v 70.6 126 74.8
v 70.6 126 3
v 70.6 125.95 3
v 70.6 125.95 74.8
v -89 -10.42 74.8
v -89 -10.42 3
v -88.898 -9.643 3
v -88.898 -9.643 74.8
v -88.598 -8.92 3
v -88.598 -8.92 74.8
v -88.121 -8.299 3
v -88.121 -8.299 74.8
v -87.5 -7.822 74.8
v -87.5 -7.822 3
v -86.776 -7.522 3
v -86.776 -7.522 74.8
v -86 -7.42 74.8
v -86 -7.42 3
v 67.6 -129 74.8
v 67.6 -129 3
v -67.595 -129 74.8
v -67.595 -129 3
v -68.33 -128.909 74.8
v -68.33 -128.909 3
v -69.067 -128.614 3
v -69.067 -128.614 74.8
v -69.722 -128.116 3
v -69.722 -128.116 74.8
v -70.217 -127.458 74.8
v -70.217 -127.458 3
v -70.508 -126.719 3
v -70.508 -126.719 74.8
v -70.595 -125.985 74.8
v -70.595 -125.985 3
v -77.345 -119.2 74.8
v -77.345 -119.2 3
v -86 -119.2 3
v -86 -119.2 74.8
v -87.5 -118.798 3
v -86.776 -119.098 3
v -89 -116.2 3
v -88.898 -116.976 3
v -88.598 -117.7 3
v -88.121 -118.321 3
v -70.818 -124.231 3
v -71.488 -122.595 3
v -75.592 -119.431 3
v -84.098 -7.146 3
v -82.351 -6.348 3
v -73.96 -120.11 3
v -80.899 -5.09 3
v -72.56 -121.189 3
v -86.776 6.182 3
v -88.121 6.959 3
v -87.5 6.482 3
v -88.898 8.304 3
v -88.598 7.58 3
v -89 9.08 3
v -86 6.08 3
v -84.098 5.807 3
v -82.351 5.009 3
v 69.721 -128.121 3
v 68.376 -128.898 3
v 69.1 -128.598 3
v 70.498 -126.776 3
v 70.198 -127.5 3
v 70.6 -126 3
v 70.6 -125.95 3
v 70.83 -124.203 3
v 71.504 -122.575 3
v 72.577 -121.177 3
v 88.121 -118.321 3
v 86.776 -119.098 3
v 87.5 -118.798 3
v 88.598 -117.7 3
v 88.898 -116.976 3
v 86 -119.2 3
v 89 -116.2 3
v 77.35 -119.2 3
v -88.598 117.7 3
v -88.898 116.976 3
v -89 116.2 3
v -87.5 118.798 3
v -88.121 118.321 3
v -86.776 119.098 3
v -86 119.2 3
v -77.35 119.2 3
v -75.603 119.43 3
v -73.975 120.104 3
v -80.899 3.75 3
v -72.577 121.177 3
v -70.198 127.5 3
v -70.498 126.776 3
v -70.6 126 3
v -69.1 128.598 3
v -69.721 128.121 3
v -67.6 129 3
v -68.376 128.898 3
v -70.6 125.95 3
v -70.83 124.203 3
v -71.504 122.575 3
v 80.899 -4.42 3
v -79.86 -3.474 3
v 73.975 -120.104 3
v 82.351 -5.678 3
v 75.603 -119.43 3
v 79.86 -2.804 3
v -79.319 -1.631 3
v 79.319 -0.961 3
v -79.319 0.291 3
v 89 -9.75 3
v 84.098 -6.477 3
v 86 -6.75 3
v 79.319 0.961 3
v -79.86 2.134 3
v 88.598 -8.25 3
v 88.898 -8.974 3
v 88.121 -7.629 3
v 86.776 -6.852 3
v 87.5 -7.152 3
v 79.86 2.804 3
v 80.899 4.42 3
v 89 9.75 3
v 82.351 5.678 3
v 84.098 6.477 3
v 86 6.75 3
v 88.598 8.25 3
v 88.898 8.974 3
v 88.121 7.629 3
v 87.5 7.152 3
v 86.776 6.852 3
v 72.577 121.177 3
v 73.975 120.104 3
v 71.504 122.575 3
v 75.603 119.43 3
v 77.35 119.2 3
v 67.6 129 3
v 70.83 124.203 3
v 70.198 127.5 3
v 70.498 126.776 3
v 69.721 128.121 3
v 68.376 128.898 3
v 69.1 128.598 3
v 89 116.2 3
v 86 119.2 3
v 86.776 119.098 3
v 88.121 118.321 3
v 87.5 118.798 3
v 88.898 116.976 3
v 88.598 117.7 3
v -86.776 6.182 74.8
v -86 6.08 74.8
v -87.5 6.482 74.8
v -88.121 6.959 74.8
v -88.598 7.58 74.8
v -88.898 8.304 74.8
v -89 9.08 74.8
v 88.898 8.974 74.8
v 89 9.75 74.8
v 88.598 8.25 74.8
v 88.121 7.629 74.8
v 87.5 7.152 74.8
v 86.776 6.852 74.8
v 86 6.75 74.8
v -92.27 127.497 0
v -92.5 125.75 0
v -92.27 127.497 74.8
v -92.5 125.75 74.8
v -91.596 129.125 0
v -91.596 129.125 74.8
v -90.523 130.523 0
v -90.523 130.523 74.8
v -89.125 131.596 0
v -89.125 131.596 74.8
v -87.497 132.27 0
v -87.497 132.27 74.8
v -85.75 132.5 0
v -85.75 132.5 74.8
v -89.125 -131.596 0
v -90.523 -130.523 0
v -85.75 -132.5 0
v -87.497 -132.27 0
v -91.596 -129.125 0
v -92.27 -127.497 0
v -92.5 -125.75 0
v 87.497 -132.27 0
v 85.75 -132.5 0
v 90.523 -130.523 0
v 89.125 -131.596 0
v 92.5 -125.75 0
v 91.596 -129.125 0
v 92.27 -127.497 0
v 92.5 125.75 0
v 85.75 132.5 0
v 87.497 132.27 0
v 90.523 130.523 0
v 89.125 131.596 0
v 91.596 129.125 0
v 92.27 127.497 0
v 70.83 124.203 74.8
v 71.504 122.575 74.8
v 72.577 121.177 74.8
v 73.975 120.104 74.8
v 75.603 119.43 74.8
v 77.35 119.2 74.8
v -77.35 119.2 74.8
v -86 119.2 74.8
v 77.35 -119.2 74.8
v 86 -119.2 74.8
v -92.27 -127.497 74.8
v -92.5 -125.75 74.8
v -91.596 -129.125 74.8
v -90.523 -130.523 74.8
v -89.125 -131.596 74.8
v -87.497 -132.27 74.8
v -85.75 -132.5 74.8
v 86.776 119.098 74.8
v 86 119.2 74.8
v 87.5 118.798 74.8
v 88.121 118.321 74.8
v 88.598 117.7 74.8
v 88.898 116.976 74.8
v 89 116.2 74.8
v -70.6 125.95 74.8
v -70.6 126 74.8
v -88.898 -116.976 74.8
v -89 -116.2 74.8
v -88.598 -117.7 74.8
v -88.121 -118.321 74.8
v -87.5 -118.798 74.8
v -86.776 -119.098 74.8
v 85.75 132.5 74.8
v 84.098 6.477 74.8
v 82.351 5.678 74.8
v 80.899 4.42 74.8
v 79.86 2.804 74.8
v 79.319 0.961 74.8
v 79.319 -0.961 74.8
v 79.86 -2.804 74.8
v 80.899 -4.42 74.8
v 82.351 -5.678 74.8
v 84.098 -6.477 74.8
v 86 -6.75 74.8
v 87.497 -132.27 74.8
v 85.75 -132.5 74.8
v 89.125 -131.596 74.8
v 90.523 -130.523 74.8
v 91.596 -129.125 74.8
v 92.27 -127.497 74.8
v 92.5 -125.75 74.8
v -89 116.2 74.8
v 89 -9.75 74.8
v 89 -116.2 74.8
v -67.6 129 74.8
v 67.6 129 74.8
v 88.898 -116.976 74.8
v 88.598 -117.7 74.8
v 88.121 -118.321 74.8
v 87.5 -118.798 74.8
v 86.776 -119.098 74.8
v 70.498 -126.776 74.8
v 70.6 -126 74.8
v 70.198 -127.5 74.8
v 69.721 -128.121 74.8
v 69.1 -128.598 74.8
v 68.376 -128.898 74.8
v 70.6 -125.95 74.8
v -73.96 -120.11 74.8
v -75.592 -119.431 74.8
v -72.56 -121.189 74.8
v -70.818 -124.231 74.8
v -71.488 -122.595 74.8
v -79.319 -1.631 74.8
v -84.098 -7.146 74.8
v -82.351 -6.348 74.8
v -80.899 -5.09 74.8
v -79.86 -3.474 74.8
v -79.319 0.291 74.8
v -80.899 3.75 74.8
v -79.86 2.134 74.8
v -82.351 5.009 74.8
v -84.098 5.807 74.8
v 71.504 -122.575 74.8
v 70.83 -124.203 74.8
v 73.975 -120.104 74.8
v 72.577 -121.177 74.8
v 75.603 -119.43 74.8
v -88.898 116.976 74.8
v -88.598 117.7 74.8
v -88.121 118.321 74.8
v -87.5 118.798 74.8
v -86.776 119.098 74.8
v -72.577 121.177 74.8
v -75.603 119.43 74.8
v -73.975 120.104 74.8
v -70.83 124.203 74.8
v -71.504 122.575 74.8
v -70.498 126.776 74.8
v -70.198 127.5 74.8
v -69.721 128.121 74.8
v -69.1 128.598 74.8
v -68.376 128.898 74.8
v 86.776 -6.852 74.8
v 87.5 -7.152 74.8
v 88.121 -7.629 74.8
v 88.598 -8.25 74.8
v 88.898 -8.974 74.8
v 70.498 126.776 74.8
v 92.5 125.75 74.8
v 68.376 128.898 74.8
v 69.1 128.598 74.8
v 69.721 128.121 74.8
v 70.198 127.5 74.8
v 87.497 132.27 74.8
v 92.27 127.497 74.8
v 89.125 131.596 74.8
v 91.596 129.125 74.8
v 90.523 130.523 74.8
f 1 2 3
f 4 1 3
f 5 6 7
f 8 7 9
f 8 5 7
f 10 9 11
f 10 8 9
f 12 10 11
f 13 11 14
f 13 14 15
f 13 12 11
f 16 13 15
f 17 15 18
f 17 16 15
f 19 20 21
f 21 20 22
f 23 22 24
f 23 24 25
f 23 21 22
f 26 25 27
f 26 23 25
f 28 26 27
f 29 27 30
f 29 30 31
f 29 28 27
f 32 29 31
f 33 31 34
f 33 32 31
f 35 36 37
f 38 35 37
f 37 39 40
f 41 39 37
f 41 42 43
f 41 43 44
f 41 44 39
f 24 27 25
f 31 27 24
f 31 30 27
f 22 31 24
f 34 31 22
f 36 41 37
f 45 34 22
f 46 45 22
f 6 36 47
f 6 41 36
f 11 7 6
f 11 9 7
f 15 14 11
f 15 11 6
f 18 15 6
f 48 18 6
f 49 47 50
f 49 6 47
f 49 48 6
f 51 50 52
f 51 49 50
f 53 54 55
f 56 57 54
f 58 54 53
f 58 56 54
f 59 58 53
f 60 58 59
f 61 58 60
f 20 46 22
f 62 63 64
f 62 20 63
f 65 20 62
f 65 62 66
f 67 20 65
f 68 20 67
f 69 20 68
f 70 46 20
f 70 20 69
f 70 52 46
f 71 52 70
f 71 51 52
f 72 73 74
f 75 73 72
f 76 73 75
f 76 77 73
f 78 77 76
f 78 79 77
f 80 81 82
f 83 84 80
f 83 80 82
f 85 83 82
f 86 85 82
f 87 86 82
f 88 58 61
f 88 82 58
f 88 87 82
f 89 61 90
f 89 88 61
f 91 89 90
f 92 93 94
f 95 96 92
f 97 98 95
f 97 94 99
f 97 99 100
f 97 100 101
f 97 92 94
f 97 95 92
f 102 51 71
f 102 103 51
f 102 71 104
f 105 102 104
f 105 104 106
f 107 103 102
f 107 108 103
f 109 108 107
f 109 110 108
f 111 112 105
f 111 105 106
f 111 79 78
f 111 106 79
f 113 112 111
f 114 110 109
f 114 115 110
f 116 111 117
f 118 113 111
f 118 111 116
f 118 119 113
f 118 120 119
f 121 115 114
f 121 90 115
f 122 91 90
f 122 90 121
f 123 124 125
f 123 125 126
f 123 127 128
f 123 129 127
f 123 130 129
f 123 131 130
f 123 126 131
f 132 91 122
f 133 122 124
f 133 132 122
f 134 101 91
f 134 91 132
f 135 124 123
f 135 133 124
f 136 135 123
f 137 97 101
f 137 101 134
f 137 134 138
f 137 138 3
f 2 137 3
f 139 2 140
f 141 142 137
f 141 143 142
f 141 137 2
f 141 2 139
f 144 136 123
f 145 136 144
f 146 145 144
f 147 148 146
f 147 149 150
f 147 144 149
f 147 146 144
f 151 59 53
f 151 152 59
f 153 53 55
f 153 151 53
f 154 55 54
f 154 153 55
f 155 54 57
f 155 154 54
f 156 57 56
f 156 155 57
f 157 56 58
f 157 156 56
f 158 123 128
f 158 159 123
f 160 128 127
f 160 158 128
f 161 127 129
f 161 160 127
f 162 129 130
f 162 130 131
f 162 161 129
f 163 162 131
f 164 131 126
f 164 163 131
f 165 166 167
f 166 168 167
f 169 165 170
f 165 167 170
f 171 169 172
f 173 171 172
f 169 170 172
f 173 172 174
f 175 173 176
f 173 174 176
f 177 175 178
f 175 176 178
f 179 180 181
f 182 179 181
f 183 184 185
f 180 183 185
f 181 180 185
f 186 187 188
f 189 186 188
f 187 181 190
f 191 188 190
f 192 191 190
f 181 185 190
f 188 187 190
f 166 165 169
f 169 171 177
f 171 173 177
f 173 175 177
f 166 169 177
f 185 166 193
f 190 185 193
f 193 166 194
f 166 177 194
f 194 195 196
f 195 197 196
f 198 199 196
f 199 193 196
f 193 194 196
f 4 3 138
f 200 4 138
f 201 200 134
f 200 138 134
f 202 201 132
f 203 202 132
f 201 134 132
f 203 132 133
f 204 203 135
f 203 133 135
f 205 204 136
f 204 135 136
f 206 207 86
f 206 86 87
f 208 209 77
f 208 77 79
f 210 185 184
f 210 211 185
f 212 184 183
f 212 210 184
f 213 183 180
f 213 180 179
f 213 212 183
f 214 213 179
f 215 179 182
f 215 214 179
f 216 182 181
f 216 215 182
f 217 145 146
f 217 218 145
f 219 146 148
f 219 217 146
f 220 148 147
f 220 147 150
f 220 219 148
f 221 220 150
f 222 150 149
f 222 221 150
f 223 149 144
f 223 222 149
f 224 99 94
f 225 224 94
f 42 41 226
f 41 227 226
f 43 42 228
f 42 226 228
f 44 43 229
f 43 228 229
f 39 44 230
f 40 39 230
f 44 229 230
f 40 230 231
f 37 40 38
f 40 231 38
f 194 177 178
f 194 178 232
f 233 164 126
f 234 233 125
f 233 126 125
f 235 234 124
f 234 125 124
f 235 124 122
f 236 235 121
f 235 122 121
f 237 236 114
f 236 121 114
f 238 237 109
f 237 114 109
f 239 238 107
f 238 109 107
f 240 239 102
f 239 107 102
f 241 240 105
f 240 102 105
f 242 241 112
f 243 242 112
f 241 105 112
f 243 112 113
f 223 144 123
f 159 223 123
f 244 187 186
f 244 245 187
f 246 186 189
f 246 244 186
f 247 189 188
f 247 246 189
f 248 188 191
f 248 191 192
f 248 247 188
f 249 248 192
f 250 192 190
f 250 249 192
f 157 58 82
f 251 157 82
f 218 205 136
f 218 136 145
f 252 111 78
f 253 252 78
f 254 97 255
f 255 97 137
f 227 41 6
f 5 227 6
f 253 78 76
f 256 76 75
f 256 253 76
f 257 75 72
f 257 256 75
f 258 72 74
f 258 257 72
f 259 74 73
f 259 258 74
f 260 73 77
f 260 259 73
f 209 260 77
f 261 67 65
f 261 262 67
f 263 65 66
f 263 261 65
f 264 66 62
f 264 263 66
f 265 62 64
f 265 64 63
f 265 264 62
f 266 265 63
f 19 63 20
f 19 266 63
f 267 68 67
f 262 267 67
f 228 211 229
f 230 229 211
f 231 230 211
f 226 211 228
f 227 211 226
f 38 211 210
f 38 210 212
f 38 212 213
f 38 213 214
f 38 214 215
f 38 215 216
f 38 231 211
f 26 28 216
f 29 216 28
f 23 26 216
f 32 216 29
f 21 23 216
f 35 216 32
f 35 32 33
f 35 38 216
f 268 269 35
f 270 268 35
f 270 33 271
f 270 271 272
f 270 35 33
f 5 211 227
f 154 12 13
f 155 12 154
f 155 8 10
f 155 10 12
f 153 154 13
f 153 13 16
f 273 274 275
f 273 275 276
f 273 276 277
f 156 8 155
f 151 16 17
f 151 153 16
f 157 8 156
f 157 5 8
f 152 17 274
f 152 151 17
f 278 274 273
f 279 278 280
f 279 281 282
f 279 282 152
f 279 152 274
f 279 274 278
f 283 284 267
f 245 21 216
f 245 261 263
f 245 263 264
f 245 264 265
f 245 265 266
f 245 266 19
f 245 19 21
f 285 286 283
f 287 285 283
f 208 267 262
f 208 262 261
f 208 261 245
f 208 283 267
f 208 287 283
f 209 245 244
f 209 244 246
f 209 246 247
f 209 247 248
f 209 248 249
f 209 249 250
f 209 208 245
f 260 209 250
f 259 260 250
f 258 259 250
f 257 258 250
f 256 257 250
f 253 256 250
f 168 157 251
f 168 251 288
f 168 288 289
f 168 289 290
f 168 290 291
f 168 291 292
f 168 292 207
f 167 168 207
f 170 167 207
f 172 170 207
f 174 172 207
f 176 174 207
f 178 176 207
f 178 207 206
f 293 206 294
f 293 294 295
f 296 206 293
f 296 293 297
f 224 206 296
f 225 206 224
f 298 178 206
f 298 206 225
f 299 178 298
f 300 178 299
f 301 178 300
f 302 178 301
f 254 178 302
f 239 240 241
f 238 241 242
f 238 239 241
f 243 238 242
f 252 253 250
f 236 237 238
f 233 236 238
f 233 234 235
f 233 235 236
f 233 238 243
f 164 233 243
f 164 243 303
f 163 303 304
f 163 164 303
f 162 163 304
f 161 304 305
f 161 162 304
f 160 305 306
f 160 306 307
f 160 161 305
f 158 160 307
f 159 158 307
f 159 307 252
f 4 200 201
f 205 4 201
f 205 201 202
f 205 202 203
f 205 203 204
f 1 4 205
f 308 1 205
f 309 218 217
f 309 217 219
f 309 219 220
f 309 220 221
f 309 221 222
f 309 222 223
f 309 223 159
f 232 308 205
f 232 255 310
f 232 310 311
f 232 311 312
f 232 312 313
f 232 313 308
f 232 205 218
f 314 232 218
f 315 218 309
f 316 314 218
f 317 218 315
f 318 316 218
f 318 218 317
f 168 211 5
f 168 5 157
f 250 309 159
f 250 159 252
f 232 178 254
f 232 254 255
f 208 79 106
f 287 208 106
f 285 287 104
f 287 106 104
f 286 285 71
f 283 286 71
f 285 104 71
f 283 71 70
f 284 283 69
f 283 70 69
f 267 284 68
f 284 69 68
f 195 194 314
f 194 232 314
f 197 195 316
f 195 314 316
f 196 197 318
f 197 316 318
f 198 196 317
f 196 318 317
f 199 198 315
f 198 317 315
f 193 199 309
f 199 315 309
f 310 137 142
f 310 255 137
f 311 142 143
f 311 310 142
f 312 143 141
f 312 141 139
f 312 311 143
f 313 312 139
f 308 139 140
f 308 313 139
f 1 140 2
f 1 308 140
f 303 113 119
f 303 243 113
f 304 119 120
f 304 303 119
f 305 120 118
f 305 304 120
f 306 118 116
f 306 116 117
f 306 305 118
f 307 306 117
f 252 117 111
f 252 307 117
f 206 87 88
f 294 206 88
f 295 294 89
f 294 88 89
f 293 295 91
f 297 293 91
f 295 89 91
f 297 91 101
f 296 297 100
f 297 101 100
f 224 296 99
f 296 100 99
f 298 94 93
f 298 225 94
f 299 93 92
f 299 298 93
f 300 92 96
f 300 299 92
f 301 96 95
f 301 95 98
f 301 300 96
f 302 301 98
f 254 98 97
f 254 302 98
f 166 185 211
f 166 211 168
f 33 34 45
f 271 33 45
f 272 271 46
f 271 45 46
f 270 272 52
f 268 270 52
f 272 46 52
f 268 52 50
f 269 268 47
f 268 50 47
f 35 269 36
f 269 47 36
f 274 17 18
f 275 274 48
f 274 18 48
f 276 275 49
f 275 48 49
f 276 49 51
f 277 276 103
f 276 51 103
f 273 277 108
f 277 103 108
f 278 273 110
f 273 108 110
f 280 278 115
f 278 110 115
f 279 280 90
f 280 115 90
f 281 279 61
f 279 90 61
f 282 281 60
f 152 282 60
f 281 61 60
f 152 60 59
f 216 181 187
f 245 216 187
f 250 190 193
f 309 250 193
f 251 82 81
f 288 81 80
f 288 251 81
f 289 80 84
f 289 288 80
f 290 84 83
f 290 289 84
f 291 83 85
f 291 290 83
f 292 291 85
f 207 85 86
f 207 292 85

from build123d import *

# Parameters (mm, degrees)
F1_DEPTH = 3
F0_W     = 185
F0_H     = 265
F2_DEPTH = 74.8
F3_R     = 6.75
F4_R     = 2.99999


# Not quite as in the source:
# - a fillet or chamfer is up to 0.001 mm smaller than in the source, because OpenCascade refuses the exact size
# - ends of sketch curves that miss each other by under 0.0002 mm in the source are joined


with BuildPart() as f1:
    # F0 (on Top) → F1 (new body)
    with BuildSketch(Plane.XY):
        with BuildLine():
            Line((70.6, 125.95), (70.6, 129))
            Line((70.6, 129), (-70.6, 129))
            Line((-70.6, 129), (-70.6, 125.95))
            ThreePointArc((-70.6, 125.95), (-72.577029227, 121.177029227), (-77.35, 119.2))
            Line((-77.35, 119.2), (-89, 119.2))
            Line((-89, 119.2), (-89, 6.080118008))
            Line((-89, 6.080118008), (-86, 6.080118008))
            ThreePointArc((-86, 6.080118008), (-79.25, -0.669881992), (-86, -7.419881992))
            Line((-86, -7.419881992), (-89, -7.419881992))
            Line((-89, -7.419881992), (-89, -119.2))
            Line((-89, -119.2), (-77.3450501441, -119.2))
            ThreePointArc((-77.3450501441, -119.2), (-72.4815603684, -121.2692984284), (-70.6, -126.2084541623))
            Line((-70.6, -126.2084541623), (-70.6, -129))
            Line((-70.6, -129), (70.6, -129))
            Line((70.6, -129), (70.6, -125.95))
            ThreePointArc((70.6, -125.95), (72.577029227, -121.177029227), (77.35, -119.2))
            Line((77.35, -119.2), (89, -119.2))
            Line((89, -119.2), (89, -6.75))
            Line((89, -6.75), (86, -6.75))
            ThreePointArc((86, -6.75), (79.25, 0), (86, 6.75))
            Line((86, 6.75), (89, 6.75))
            Line((89, 6.75), (89, 119.2))
            Line((89, 119.2), (77.35, 119.2))
            ThreePointArc((77.35, 119.2), (72.577029227, 121.177029227), (70.6, 125.95))
        make_face()
    extrude(amount=F1_DEPTH)

    # F0 (on Top) → F2 (join)
    with BuildSketch(Plane.XY):
        Rectangle(F0_W, F0_H)
        Polygon((70.6, 129), (89, 129), (89, 119.2), (89, 6.75), (89, -6.75), (89, -119.2), (89, -129), (70.6, -129), (-70.6, -129), (-89, -129), (-89, -119.2), (-89, -7.419881992), (-89, 6.080118008), (-89, 119.2), (-89, 129), (-70.6, 129), align=None, mode=Mode.SUBTRACT)
        with BuildLine():
            Line((-77.3450501441, -119.2), (-89, -119.2))
            Line((-89, -119.2), (-89, -129))
            Line((-89, -129), (-70.6, -129))
            Line((-70.6, -129), (-70.6, -126.2084541623))
            ThreePointArc((-70.6, -126.2084541623), (-72.4815603684, -121.2692984284), (-77.3450501441, -119.2))
        make_face()
        with BuildLine():
            Line((89, -129), (89, -119.2))
            Line((89, -119.2), (77.35, -119.2))
            ThreePointArc((77.35, -119.2), (72.577029227, -121.177029227), (70.6, -125.95))
            Line((70.6, -125.95), (70.6, -129.000006485))
            Line((70.6, -129.000006485), (89, -129))
        make_face()
        with BuildLine():
            Line((-70.6, 125.95), (-70.6, 129))
            Line((-70.6, 129), (-89, 129))
            Line((-89, 129), (-89, 119.2))
            Line((-89, 119.2), (-77.35, 119.2))
            ThreePointArc((-77.35, 119.2), (-72.577029227, 121.177029227), (-70.6, 125.95))
        make_face()
        with BuildLine():
            Line((89, 119.2), (89, 129))
            Line((89, 129), (70.6, 129))
            Line((70.6, 129), (70.6, 125.95))
            ThreePointArc((70.6, 125.95), (72.577029227, 121.177029227), (77.35, 119.2))
            Line((77.35, 119.2), (89, 119.2))
        make_face()
        with BuildLine():
            Line((-86, 6.080118008), (-89, 6.080118008))
            Line((-89, 6.080118008), (-89, -7.419881992))
            Line((-89, -7.419881992), (-86, -7.419881992))
            ThreePointArc((-86, -7.419881992), (-79.25, -0.669881992), (-86, 6.080118008))
        make_face()
        with BuildLine():
            Line((89, -6.75), (89, 6.75))
            Line((89, 6.75), (86, 6.75))
            ThreePointArc((86, 6.75), (79.25, 0), (86, -6.75))
            Line((86, -6.75), (89, -6.75))
        make_face()
    extrude(amount=F2_DEPTH)

    # F3
    f3_edges = [f1.edges().sort_by_distance(p)[0] for p in [
        (-92.5, 132.5, 37.4),
        (92.5, 132.5, 37.4),
        (92.5, -132.5, 37.4),
        (-92.5, -132.5, 37.4),
    ]]
    fillet(f3_edges, radius=F3_R)

    # F4 (radius 3 in the source; OpenCascade refuses exactly that, so slightly less here)
    f4_edges = [f1.edges().sort_by_distance(p)[0] for p in [
        (-89, 6.080118, 38.9),
        (-89, 119.2, 38.9),
        (-70.6, 129, 38.9),
        (70.6, 129, 38.9),
        (89, 119.2, 38.9),
        (-89, -7.419882, 38.9),
        (89, 6.75, 38.9),
        (89, -6.75, 38.9),
        (-89, -119.2, 38.9),
        (-70.6, -129, 38.9),
        (70.6, -129, 38.9),
        (89, -119.2, 38.9),
    ]]
    fillet(f4_edges, radius=F4_R)


solid = f1.part
